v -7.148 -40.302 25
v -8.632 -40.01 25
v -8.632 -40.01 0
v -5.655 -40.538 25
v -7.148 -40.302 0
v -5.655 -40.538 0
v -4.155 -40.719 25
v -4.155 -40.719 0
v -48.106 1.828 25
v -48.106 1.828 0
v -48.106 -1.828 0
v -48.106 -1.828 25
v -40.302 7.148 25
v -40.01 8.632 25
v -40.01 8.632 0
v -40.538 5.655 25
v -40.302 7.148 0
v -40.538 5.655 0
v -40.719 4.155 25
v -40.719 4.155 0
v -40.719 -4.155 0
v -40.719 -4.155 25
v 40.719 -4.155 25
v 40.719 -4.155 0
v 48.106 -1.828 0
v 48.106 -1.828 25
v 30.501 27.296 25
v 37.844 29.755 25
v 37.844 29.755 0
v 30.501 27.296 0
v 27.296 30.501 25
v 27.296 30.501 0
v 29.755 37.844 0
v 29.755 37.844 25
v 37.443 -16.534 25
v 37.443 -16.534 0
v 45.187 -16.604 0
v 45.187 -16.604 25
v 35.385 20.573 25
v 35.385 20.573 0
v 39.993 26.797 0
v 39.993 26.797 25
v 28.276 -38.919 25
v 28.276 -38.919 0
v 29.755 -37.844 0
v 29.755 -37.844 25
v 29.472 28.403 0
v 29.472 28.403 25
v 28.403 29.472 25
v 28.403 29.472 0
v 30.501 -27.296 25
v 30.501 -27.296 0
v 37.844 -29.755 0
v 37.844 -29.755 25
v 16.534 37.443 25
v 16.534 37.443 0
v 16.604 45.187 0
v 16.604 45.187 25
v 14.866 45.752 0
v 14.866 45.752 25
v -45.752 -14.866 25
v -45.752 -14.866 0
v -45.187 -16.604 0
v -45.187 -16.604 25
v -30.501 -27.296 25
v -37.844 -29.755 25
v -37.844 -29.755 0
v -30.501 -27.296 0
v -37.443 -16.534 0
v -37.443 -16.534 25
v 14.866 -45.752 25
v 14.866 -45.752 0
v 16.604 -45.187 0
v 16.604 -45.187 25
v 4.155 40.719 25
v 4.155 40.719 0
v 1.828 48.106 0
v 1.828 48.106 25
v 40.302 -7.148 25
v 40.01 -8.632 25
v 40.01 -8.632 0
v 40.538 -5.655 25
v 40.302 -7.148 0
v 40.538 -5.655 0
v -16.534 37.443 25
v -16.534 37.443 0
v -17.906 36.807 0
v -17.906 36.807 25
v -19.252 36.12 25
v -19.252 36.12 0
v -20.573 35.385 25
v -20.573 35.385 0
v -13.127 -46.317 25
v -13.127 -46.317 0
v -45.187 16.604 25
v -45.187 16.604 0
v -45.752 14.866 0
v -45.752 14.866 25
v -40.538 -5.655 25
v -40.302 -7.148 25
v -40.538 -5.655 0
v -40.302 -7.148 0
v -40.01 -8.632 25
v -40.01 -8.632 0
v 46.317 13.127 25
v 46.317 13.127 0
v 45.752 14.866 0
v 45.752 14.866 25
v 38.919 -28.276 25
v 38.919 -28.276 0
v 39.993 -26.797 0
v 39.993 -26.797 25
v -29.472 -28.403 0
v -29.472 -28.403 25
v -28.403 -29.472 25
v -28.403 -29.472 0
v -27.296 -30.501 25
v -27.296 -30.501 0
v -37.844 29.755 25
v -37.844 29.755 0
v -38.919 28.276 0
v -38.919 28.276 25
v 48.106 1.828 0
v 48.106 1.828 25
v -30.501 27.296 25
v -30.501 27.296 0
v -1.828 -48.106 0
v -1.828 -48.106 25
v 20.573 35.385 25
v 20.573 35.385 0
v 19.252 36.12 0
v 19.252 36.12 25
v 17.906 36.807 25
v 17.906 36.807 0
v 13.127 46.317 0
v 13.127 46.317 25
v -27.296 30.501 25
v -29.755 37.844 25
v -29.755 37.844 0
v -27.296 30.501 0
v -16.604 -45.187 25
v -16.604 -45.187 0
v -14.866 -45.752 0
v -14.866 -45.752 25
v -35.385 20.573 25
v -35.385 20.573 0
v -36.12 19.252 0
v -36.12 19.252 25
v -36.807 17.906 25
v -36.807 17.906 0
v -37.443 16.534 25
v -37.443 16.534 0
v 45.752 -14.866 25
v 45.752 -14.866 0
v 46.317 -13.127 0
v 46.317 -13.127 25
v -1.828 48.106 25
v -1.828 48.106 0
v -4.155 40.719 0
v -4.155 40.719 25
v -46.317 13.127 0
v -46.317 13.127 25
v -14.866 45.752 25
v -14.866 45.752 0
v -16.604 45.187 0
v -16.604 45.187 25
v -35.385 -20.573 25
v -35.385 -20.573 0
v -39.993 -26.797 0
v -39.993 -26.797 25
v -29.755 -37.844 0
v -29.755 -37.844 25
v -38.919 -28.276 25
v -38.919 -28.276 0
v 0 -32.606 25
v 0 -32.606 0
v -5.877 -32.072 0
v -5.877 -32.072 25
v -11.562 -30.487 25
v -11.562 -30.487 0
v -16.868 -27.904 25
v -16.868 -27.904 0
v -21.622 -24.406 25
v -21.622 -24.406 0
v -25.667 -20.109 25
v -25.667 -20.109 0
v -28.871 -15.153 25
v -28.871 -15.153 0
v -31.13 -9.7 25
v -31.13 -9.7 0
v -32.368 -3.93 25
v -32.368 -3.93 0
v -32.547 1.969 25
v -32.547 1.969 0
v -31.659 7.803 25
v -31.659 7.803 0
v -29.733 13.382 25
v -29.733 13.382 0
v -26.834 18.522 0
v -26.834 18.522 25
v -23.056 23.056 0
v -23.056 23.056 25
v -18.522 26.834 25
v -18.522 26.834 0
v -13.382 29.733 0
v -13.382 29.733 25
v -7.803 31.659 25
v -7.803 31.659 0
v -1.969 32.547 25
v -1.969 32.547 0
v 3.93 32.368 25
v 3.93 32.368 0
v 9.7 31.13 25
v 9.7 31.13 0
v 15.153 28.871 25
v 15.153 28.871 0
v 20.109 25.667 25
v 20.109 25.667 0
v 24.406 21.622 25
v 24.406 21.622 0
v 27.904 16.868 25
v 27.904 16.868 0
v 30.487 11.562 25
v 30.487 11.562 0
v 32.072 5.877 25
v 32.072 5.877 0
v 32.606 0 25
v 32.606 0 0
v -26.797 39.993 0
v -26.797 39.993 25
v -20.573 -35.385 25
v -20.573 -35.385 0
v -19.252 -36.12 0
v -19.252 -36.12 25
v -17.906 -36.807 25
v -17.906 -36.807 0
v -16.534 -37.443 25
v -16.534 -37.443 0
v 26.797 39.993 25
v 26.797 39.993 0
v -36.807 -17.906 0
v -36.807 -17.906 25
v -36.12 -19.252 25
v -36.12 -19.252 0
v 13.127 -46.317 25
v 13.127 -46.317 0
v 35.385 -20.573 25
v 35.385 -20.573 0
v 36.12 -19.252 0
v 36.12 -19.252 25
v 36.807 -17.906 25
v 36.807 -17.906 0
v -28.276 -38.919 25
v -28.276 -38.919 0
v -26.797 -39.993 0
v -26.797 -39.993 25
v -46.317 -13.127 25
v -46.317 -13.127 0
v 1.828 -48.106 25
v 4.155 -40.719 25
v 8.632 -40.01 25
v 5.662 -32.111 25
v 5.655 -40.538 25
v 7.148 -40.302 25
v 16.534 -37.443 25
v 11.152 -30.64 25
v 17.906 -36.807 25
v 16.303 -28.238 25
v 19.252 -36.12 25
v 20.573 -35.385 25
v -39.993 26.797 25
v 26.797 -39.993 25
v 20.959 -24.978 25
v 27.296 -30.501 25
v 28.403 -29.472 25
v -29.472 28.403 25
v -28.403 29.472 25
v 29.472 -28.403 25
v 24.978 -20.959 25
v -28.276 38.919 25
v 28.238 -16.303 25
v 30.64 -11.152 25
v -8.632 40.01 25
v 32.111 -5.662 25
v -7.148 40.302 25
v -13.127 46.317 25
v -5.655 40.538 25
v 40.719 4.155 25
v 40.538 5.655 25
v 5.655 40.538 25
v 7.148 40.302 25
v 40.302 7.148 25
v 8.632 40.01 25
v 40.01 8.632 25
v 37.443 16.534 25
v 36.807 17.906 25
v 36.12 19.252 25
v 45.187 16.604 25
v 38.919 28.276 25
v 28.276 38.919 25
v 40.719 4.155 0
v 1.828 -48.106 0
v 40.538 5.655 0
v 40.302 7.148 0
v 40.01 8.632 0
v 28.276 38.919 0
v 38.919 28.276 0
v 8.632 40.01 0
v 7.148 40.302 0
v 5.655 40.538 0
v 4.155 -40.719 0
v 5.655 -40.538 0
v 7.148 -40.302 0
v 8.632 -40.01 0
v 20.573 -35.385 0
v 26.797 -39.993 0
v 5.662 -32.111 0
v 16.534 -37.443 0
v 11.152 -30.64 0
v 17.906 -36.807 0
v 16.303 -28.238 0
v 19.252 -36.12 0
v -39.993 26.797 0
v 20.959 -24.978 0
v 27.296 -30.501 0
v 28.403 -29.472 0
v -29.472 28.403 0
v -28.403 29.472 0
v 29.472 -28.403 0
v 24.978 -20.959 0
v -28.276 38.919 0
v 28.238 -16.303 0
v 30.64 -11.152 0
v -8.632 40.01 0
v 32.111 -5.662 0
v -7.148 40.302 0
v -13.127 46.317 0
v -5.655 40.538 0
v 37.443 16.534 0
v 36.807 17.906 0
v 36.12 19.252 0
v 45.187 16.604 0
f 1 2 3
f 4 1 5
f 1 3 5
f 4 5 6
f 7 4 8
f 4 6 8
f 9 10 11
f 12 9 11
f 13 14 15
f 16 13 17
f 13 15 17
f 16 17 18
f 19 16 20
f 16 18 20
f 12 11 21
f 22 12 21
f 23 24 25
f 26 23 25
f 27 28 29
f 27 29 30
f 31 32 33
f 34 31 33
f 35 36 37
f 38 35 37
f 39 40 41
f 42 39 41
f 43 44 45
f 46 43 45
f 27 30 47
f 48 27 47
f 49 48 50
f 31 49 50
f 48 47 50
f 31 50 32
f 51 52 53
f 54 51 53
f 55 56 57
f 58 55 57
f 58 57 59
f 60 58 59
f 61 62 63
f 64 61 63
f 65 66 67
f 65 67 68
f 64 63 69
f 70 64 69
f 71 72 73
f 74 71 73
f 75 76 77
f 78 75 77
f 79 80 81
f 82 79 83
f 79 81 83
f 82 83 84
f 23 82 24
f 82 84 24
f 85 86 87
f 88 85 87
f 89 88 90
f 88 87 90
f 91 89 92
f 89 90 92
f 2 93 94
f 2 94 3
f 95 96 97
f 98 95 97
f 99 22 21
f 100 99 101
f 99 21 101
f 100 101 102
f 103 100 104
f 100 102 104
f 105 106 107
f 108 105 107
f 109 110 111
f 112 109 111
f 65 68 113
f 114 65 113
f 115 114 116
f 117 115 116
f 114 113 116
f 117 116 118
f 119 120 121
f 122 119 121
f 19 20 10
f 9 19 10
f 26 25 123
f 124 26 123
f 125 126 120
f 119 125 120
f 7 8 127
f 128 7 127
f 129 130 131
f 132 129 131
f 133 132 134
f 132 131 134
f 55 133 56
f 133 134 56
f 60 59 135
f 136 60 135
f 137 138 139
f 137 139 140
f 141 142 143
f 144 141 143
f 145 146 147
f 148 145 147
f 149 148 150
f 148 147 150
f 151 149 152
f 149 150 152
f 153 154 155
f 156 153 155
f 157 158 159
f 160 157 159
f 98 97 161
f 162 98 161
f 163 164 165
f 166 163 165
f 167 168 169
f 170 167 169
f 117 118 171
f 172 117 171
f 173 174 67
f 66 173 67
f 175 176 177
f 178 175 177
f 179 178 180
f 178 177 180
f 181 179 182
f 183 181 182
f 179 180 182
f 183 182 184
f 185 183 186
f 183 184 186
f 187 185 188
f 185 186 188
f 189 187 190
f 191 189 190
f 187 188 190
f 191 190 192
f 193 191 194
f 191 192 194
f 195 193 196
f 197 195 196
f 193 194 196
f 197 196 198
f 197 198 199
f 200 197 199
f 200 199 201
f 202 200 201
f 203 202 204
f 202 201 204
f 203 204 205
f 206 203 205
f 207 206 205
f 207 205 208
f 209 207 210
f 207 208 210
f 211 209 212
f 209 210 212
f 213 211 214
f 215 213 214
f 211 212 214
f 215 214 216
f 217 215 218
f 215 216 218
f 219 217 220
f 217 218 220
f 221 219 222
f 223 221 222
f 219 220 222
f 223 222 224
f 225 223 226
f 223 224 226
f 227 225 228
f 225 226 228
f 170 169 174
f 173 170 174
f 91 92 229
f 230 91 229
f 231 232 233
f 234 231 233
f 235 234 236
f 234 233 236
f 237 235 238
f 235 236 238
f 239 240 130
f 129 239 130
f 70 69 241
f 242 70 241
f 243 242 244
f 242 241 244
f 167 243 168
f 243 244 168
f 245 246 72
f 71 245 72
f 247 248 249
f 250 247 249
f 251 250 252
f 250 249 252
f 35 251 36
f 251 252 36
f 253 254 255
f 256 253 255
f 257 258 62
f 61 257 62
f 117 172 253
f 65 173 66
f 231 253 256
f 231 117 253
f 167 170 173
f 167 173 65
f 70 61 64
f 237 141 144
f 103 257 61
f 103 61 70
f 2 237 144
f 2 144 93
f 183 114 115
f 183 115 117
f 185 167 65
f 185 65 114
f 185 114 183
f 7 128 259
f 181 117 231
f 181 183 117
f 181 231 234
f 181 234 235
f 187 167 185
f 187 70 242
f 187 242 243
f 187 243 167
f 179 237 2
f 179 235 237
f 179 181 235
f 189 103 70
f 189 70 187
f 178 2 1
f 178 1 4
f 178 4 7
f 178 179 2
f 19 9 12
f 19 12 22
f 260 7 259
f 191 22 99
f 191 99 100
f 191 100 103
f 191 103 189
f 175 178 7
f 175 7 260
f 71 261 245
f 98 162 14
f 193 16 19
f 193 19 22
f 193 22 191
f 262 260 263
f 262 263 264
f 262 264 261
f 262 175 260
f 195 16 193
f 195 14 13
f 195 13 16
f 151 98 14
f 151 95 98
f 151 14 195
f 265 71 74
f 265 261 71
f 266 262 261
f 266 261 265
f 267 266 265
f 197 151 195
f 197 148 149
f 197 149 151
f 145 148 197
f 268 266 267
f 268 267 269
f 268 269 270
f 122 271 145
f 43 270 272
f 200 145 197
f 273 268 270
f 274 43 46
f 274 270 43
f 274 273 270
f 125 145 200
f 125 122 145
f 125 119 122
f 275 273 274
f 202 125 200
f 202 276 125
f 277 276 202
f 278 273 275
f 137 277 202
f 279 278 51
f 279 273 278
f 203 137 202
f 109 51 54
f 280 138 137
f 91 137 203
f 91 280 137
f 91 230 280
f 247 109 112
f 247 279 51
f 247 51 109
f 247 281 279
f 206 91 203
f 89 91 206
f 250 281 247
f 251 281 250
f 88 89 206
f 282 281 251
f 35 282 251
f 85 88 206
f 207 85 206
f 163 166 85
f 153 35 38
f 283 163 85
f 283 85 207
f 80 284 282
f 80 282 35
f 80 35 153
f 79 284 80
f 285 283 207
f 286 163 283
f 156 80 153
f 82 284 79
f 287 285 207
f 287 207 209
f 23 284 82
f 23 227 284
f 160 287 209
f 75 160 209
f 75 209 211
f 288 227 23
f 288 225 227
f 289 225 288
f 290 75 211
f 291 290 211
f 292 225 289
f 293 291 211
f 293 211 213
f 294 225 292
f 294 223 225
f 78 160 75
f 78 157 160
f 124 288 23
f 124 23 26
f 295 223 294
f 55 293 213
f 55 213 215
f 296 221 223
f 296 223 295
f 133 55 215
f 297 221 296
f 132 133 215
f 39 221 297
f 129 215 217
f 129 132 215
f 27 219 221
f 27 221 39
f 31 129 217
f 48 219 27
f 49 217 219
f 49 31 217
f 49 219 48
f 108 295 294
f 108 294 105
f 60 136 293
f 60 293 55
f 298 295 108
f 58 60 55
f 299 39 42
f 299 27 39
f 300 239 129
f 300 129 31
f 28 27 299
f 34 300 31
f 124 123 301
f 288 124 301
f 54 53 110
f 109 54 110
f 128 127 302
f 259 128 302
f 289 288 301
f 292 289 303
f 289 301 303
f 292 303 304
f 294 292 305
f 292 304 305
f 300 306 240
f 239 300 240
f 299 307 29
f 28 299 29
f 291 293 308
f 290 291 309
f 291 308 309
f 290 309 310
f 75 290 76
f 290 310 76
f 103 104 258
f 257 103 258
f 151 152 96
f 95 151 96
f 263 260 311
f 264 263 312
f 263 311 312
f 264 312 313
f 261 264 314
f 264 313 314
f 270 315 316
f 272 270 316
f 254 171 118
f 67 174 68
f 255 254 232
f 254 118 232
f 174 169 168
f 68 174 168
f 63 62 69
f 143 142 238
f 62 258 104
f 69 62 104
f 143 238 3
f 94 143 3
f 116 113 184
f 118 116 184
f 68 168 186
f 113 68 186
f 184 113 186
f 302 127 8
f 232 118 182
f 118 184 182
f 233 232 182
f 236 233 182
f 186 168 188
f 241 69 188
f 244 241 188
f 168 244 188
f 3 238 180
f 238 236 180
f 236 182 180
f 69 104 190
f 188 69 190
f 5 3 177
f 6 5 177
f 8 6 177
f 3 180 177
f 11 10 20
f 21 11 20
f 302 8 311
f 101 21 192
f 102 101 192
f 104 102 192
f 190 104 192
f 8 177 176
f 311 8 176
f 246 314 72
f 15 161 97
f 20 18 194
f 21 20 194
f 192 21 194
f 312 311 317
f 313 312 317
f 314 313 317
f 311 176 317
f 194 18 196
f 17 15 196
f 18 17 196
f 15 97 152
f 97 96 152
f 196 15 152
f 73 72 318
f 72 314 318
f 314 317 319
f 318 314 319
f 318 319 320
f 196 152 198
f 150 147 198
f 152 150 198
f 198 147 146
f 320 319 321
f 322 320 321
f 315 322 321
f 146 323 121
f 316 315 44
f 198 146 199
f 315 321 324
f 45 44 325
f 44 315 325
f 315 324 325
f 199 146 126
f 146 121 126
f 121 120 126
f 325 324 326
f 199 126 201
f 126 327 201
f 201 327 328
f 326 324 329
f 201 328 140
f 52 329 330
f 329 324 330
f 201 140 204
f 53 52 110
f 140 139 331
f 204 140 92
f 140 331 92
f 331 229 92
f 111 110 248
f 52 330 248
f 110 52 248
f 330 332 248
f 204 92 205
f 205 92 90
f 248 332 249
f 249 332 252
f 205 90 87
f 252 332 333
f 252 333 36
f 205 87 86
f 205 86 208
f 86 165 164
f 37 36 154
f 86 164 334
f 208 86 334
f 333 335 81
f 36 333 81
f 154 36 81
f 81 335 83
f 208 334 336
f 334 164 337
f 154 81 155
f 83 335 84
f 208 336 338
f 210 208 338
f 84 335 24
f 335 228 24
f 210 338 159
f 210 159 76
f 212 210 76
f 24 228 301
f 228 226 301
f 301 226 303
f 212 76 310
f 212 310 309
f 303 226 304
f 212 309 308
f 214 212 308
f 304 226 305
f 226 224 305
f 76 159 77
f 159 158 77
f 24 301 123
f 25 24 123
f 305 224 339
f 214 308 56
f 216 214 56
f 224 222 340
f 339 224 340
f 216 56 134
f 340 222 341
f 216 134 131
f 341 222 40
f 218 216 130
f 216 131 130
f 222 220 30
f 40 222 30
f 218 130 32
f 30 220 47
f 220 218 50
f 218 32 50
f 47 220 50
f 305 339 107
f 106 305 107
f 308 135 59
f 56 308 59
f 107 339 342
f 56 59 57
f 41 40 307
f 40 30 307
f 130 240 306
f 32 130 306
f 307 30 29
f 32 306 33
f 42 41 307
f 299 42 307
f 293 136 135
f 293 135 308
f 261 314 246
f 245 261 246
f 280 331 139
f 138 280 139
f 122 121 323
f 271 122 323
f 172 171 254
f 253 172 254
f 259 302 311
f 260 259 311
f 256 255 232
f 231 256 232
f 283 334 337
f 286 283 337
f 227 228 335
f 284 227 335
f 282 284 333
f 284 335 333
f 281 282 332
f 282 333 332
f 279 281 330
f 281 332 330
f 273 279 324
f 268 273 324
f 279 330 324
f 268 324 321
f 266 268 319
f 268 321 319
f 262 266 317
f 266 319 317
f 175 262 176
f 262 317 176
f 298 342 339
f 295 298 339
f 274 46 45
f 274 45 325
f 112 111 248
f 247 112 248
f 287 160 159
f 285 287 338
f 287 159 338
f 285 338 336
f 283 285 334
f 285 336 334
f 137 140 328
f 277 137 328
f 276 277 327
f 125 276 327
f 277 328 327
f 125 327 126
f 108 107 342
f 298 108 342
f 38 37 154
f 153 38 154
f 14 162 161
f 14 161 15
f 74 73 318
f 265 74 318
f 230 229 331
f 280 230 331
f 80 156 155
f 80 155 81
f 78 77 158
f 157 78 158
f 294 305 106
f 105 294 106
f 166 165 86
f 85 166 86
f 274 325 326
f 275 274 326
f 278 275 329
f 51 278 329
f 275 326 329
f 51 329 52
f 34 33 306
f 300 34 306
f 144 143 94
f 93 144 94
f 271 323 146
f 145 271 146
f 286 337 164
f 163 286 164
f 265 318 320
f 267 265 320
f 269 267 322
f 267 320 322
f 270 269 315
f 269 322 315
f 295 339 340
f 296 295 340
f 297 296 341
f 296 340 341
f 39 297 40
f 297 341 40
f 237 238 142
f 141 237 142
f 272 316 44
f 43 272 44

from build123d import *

# Parameters (mm, degrees)
F2_DEPTH = 25


with BuildPart() as f2:
    # F1 (on Top) → F2 (new body)
    with BuildSketch(Plane.XY):
        with BuildLine():
            Line((-1.828092, -48.106283), (0, -48.106283))
            Line((0, -48.106283), (1.828092, -48.106283))
            Line((1.828092, -48.106283), (4.154787, -40.719498))
            ThreePointArc((4.154787, -40.719498), (6.403006, -40.426987), (8.63158, -40.010444))
            Line((8.63158, -40.010444), (13.12704, -46.316705))
            Line((13.12704, -46.316705), (14.865659, -45.751794))
            Line((14.865659, -45.751794), (16.604278, -45.186882))
            Line((16.604278, -45.186882), (16.534454, -37.442644))
            ThreePointArc((16.534454, -37.442644), (18.582246, -36.469712), (20.573027, -35.384888))
            Line((20.573027, -35.384888), (26.797206, -39.993326))
            Line((26.797206, -39.993326), (28.276164, -38.9188))
            Line((28.276164, -38.9188), (29.755121, -37.844275))
            Line((29.755121, -37.844275), (27.295614, -30.500643))
            ThreePointArc((27.295614, -30.500643), (28.942527, -28.942527), (30.500643, -27.295614))
            Line((30.500643, -27.295614), (37.844275, -29.755121))
            Line((37.844275, -29.755121), (38.9188, -28.276164))
            Line((38.9188, -28.276164), (39.993326, -26.797206))
            Line((39.993326, -26.797206), (35.384888, -20.573027))
            ThreePointArc((35.384888, -20.573027), (36.469712, -18.582246), (37.442644, -16.534454))
            Line((37.442644, -16.534454), (45.186882, -16.604278))
            Line((45.186882, -16.604278), (45.751794, -14.865659))
            Line((45.751794, -14.865659), (46.316705, -13.12704))
            Line((46.316705, -13.12704), (40.010444, -8.63158))
            ThreePointArc((40.010444, -8.63158), (40.426987, -6.403006), (40.719498, -4.154787))
            Line((40.719498, -4.154787), (48.106283, -1.828092))
            Line((48.106283, -1.828092), (48.106283, 0))
            Line((48.106283, 0), (48.106283, 1.828092))
            Line((48.106283, 1.828092), (40.719498, 4.154787))
            ThreePointArc((40.719498, 4.154787), (40.426987, 6.403006), (40.010444, 8.63158))
            Line((40.010444, 8.63158), (46.316705, 13.12704))
            Line((46.316705, 13.12704), (45.751794, 14.865659))
            Line((45.751794, 14.865659), (45.186882, 16.604278))
            Line((45.186882, 16.604278), (37.442644, 16.534454))
            ThreePointArc((37.442644, 16.534454), (36.469712, 18.582246), (35.384888, 20.573027))
            Line((35.384888, 20.573027), (39.993326, 26.797206))
            Line((39.993326, 26.797206), (38.9188, 28.276164))
            Line((38.9188, 28.276164), (37.844275, 29.755121))
            Line((37.844275, 29.755121), (30.500643, 27.295614))
            ThreePointArc((30.500643, 27.295614), (28.942527, 28.942527), (27.295614, 30.500643))
            Line((27.295614, 30.500643), (29.755121, 37.844275))
            Line((29.755121, 37.844275), (28.276164, 38.9188))
            Line((28.276164, 38.9188), (26.797206, 39.993326))
            Line((26.797206, 39.993326), (20.573027, 35.384888))
            ThreePointArc((20.573027, 35.384888), (18.582246, 36.469712), (16.534454, 37.442644))
            Line((16.534454, 37.442644), (16.604278, 45.186882))
            Line((16.604278, 45.186882), (14.865659, 45.751794))
            Line((14.865659, 45.751794), (13.12704, 46.316705))
            Line((13.12704, 46.316705), (8.63158, 40.010444))
            ThreePointArc((8.63158, 40.010444), (6.403006, 40.426987), (4.154787, 40.719498))
            Line((4.154787, 40.719498), (1.828092, 48.106283))
            Line((1.828092, 48.106283), (0, 48.106283))
            Line((0, 48.106283), (-1.828092, 48.106283))
            Line((-1.828092, 48.106283), (-4.154787, 40.719498))
            ThreePointArc((-4.154787, 40.719498), (-6.403006, 40.426987), (-8.63158, 40.010444))
            Line((-8.63158, 40.010444), (-13.12704, 46.316705))
            Line((-13.12704, 46.316705), (-14.865659, 45.751794))
            Line((-14.865659, 45.751794), (-16.604278, 45.186882))
            Line((-16.604278, 45.186882), (-16.534454, 37.442644))
            ThreePointArc((-16.534454, 37.442644), (-18.582246, 36.469712), (-20.573027, 35.384888))
            Line((-20.573027, 35.384888), (-26.797206, 39.993326))
            Line((-26.797206, 39.993326), (-28.276164, 38.9188))
            Line((-28.276164, 38.9188), (-29.755121, 37.844275))
            Line((-29.755121, 37.844275), (-27.295614, 30.500643))
            ThreePointArc((-27.295614, 30.500643), (-28.942527, 28.942527), (-30.500643, 27.295614))
            Line((-30.500643, 27.295614), (-37.844275, 29.755121))
            Line((-37.844275, 29.755121), (-38.9188, 28.276164))
            Line((-38.9188, 28.276164), (-39.993326, 26.797206))
            Line((-39.993326, 26.797206), (-35.384888, 20.573027))
            ThreePointArc((-35.384888, 20.573027), (-36.469712, 18.582246), (-37.442644, 16.534454))
            Line((-37.442644, 16.534454), (-45.186882, 16.604278))
            Line((-45.186882, 16.604278), (-45.751794, 14.865659))
            Line((-45.751794, 14.865659), (-46.316705, 13.12704))
            Line((-46.316705, 13.12704), (-40.010444, 8.63158))
            ThreePointArc((-40.010444, 8.63158), (-40.426987, 6.403006), (-40.719498, 4.154787))
            Line((-40.719498, 4.154787), (-48.106283, 1.828092))
            Line((-48.106283, 1.828092), (-48.106283, 0))
            Line((-48.106283, 0), (-48.106283, -1.828092))
            Line((-48.106283, -1.828092), (-40.719498, -4.154787))
            ThreePointArc((-40.719498, -4.154787), (-40.426987, -6.403006), (-40.010444, -8.63158))
            Line((-40.010444, -8.63158), (-46.316705, -13.12704))
            Line((-46.316705, -13.12704), (-45.751794, -14.865659))
            Line((-45.751794, -14.865659), (-45.186882, -16.604278))
            Line((-45.186882, -16.604278), (-37.442644, -16.534454))
            ThreePointArc((-37.442644, -16.534454), (-36.469712, -18.582246), (-35.384888, -20.573027))
            Line((-35.384888, -20.573027), (-39.993326, -26.797206))
            Line((-39.993326, -26.797206), (-38.9188, -28.276164))
            Line((-38.9188, -28.276164), (-37.844275, -29.755121))
            Line((-37.844275, -29.755121), (-30.500643, -27.295614))
            ThreePointArc((-30.500643, -27.295614), (-28.942527, -28.942527), (-27.295614, -30.500643))
            Line((-27.295614, -30.500643), (-29.755121, -37.844275))
            Line((-29.755121, -37.844275), (-28.276164, -38.9188))
            Line((-28.276164, -38.9188), (-26.797206, -39.993326))
            Line((-26.797206, -39.993326), (-20.573027, -35.384888))
            ThreePointArc((-20.573027, -35.384888), (-18.582246, -36.469712), (-16.534454, -37.442644))
            Line((-16.534454, -37.442644), (-16.604278, -45.186882))
            Line((-16.604278, -45.186882), (-14.865659, -45.751794))
            Line((-14.865659, -45.751794), (-13.12704, -46.316705))
            Line((-13.12704, -46.316705), (-8.63158, -40.010444))
            ThreePointArc((-8.63158, -40.010444), (-6.403006, -40.426987), (-4.154787, -40.719498))
            Line((-4.154787, -40.719498), (-1.828092, -48.106283))
        make_face()
        with BuildLine():
            ThreePointArc((32.605994, 0), (23.05592, -23.05592), (0, -32.605994))
            ThreePointArc((0, -32.605994), (-23.05592, 23.05592), (32.605994, 0))
        make_face(mode=Mode.SUBTRACT)
    extrude(amount=F2_DEPTH)


solid = f2.part
